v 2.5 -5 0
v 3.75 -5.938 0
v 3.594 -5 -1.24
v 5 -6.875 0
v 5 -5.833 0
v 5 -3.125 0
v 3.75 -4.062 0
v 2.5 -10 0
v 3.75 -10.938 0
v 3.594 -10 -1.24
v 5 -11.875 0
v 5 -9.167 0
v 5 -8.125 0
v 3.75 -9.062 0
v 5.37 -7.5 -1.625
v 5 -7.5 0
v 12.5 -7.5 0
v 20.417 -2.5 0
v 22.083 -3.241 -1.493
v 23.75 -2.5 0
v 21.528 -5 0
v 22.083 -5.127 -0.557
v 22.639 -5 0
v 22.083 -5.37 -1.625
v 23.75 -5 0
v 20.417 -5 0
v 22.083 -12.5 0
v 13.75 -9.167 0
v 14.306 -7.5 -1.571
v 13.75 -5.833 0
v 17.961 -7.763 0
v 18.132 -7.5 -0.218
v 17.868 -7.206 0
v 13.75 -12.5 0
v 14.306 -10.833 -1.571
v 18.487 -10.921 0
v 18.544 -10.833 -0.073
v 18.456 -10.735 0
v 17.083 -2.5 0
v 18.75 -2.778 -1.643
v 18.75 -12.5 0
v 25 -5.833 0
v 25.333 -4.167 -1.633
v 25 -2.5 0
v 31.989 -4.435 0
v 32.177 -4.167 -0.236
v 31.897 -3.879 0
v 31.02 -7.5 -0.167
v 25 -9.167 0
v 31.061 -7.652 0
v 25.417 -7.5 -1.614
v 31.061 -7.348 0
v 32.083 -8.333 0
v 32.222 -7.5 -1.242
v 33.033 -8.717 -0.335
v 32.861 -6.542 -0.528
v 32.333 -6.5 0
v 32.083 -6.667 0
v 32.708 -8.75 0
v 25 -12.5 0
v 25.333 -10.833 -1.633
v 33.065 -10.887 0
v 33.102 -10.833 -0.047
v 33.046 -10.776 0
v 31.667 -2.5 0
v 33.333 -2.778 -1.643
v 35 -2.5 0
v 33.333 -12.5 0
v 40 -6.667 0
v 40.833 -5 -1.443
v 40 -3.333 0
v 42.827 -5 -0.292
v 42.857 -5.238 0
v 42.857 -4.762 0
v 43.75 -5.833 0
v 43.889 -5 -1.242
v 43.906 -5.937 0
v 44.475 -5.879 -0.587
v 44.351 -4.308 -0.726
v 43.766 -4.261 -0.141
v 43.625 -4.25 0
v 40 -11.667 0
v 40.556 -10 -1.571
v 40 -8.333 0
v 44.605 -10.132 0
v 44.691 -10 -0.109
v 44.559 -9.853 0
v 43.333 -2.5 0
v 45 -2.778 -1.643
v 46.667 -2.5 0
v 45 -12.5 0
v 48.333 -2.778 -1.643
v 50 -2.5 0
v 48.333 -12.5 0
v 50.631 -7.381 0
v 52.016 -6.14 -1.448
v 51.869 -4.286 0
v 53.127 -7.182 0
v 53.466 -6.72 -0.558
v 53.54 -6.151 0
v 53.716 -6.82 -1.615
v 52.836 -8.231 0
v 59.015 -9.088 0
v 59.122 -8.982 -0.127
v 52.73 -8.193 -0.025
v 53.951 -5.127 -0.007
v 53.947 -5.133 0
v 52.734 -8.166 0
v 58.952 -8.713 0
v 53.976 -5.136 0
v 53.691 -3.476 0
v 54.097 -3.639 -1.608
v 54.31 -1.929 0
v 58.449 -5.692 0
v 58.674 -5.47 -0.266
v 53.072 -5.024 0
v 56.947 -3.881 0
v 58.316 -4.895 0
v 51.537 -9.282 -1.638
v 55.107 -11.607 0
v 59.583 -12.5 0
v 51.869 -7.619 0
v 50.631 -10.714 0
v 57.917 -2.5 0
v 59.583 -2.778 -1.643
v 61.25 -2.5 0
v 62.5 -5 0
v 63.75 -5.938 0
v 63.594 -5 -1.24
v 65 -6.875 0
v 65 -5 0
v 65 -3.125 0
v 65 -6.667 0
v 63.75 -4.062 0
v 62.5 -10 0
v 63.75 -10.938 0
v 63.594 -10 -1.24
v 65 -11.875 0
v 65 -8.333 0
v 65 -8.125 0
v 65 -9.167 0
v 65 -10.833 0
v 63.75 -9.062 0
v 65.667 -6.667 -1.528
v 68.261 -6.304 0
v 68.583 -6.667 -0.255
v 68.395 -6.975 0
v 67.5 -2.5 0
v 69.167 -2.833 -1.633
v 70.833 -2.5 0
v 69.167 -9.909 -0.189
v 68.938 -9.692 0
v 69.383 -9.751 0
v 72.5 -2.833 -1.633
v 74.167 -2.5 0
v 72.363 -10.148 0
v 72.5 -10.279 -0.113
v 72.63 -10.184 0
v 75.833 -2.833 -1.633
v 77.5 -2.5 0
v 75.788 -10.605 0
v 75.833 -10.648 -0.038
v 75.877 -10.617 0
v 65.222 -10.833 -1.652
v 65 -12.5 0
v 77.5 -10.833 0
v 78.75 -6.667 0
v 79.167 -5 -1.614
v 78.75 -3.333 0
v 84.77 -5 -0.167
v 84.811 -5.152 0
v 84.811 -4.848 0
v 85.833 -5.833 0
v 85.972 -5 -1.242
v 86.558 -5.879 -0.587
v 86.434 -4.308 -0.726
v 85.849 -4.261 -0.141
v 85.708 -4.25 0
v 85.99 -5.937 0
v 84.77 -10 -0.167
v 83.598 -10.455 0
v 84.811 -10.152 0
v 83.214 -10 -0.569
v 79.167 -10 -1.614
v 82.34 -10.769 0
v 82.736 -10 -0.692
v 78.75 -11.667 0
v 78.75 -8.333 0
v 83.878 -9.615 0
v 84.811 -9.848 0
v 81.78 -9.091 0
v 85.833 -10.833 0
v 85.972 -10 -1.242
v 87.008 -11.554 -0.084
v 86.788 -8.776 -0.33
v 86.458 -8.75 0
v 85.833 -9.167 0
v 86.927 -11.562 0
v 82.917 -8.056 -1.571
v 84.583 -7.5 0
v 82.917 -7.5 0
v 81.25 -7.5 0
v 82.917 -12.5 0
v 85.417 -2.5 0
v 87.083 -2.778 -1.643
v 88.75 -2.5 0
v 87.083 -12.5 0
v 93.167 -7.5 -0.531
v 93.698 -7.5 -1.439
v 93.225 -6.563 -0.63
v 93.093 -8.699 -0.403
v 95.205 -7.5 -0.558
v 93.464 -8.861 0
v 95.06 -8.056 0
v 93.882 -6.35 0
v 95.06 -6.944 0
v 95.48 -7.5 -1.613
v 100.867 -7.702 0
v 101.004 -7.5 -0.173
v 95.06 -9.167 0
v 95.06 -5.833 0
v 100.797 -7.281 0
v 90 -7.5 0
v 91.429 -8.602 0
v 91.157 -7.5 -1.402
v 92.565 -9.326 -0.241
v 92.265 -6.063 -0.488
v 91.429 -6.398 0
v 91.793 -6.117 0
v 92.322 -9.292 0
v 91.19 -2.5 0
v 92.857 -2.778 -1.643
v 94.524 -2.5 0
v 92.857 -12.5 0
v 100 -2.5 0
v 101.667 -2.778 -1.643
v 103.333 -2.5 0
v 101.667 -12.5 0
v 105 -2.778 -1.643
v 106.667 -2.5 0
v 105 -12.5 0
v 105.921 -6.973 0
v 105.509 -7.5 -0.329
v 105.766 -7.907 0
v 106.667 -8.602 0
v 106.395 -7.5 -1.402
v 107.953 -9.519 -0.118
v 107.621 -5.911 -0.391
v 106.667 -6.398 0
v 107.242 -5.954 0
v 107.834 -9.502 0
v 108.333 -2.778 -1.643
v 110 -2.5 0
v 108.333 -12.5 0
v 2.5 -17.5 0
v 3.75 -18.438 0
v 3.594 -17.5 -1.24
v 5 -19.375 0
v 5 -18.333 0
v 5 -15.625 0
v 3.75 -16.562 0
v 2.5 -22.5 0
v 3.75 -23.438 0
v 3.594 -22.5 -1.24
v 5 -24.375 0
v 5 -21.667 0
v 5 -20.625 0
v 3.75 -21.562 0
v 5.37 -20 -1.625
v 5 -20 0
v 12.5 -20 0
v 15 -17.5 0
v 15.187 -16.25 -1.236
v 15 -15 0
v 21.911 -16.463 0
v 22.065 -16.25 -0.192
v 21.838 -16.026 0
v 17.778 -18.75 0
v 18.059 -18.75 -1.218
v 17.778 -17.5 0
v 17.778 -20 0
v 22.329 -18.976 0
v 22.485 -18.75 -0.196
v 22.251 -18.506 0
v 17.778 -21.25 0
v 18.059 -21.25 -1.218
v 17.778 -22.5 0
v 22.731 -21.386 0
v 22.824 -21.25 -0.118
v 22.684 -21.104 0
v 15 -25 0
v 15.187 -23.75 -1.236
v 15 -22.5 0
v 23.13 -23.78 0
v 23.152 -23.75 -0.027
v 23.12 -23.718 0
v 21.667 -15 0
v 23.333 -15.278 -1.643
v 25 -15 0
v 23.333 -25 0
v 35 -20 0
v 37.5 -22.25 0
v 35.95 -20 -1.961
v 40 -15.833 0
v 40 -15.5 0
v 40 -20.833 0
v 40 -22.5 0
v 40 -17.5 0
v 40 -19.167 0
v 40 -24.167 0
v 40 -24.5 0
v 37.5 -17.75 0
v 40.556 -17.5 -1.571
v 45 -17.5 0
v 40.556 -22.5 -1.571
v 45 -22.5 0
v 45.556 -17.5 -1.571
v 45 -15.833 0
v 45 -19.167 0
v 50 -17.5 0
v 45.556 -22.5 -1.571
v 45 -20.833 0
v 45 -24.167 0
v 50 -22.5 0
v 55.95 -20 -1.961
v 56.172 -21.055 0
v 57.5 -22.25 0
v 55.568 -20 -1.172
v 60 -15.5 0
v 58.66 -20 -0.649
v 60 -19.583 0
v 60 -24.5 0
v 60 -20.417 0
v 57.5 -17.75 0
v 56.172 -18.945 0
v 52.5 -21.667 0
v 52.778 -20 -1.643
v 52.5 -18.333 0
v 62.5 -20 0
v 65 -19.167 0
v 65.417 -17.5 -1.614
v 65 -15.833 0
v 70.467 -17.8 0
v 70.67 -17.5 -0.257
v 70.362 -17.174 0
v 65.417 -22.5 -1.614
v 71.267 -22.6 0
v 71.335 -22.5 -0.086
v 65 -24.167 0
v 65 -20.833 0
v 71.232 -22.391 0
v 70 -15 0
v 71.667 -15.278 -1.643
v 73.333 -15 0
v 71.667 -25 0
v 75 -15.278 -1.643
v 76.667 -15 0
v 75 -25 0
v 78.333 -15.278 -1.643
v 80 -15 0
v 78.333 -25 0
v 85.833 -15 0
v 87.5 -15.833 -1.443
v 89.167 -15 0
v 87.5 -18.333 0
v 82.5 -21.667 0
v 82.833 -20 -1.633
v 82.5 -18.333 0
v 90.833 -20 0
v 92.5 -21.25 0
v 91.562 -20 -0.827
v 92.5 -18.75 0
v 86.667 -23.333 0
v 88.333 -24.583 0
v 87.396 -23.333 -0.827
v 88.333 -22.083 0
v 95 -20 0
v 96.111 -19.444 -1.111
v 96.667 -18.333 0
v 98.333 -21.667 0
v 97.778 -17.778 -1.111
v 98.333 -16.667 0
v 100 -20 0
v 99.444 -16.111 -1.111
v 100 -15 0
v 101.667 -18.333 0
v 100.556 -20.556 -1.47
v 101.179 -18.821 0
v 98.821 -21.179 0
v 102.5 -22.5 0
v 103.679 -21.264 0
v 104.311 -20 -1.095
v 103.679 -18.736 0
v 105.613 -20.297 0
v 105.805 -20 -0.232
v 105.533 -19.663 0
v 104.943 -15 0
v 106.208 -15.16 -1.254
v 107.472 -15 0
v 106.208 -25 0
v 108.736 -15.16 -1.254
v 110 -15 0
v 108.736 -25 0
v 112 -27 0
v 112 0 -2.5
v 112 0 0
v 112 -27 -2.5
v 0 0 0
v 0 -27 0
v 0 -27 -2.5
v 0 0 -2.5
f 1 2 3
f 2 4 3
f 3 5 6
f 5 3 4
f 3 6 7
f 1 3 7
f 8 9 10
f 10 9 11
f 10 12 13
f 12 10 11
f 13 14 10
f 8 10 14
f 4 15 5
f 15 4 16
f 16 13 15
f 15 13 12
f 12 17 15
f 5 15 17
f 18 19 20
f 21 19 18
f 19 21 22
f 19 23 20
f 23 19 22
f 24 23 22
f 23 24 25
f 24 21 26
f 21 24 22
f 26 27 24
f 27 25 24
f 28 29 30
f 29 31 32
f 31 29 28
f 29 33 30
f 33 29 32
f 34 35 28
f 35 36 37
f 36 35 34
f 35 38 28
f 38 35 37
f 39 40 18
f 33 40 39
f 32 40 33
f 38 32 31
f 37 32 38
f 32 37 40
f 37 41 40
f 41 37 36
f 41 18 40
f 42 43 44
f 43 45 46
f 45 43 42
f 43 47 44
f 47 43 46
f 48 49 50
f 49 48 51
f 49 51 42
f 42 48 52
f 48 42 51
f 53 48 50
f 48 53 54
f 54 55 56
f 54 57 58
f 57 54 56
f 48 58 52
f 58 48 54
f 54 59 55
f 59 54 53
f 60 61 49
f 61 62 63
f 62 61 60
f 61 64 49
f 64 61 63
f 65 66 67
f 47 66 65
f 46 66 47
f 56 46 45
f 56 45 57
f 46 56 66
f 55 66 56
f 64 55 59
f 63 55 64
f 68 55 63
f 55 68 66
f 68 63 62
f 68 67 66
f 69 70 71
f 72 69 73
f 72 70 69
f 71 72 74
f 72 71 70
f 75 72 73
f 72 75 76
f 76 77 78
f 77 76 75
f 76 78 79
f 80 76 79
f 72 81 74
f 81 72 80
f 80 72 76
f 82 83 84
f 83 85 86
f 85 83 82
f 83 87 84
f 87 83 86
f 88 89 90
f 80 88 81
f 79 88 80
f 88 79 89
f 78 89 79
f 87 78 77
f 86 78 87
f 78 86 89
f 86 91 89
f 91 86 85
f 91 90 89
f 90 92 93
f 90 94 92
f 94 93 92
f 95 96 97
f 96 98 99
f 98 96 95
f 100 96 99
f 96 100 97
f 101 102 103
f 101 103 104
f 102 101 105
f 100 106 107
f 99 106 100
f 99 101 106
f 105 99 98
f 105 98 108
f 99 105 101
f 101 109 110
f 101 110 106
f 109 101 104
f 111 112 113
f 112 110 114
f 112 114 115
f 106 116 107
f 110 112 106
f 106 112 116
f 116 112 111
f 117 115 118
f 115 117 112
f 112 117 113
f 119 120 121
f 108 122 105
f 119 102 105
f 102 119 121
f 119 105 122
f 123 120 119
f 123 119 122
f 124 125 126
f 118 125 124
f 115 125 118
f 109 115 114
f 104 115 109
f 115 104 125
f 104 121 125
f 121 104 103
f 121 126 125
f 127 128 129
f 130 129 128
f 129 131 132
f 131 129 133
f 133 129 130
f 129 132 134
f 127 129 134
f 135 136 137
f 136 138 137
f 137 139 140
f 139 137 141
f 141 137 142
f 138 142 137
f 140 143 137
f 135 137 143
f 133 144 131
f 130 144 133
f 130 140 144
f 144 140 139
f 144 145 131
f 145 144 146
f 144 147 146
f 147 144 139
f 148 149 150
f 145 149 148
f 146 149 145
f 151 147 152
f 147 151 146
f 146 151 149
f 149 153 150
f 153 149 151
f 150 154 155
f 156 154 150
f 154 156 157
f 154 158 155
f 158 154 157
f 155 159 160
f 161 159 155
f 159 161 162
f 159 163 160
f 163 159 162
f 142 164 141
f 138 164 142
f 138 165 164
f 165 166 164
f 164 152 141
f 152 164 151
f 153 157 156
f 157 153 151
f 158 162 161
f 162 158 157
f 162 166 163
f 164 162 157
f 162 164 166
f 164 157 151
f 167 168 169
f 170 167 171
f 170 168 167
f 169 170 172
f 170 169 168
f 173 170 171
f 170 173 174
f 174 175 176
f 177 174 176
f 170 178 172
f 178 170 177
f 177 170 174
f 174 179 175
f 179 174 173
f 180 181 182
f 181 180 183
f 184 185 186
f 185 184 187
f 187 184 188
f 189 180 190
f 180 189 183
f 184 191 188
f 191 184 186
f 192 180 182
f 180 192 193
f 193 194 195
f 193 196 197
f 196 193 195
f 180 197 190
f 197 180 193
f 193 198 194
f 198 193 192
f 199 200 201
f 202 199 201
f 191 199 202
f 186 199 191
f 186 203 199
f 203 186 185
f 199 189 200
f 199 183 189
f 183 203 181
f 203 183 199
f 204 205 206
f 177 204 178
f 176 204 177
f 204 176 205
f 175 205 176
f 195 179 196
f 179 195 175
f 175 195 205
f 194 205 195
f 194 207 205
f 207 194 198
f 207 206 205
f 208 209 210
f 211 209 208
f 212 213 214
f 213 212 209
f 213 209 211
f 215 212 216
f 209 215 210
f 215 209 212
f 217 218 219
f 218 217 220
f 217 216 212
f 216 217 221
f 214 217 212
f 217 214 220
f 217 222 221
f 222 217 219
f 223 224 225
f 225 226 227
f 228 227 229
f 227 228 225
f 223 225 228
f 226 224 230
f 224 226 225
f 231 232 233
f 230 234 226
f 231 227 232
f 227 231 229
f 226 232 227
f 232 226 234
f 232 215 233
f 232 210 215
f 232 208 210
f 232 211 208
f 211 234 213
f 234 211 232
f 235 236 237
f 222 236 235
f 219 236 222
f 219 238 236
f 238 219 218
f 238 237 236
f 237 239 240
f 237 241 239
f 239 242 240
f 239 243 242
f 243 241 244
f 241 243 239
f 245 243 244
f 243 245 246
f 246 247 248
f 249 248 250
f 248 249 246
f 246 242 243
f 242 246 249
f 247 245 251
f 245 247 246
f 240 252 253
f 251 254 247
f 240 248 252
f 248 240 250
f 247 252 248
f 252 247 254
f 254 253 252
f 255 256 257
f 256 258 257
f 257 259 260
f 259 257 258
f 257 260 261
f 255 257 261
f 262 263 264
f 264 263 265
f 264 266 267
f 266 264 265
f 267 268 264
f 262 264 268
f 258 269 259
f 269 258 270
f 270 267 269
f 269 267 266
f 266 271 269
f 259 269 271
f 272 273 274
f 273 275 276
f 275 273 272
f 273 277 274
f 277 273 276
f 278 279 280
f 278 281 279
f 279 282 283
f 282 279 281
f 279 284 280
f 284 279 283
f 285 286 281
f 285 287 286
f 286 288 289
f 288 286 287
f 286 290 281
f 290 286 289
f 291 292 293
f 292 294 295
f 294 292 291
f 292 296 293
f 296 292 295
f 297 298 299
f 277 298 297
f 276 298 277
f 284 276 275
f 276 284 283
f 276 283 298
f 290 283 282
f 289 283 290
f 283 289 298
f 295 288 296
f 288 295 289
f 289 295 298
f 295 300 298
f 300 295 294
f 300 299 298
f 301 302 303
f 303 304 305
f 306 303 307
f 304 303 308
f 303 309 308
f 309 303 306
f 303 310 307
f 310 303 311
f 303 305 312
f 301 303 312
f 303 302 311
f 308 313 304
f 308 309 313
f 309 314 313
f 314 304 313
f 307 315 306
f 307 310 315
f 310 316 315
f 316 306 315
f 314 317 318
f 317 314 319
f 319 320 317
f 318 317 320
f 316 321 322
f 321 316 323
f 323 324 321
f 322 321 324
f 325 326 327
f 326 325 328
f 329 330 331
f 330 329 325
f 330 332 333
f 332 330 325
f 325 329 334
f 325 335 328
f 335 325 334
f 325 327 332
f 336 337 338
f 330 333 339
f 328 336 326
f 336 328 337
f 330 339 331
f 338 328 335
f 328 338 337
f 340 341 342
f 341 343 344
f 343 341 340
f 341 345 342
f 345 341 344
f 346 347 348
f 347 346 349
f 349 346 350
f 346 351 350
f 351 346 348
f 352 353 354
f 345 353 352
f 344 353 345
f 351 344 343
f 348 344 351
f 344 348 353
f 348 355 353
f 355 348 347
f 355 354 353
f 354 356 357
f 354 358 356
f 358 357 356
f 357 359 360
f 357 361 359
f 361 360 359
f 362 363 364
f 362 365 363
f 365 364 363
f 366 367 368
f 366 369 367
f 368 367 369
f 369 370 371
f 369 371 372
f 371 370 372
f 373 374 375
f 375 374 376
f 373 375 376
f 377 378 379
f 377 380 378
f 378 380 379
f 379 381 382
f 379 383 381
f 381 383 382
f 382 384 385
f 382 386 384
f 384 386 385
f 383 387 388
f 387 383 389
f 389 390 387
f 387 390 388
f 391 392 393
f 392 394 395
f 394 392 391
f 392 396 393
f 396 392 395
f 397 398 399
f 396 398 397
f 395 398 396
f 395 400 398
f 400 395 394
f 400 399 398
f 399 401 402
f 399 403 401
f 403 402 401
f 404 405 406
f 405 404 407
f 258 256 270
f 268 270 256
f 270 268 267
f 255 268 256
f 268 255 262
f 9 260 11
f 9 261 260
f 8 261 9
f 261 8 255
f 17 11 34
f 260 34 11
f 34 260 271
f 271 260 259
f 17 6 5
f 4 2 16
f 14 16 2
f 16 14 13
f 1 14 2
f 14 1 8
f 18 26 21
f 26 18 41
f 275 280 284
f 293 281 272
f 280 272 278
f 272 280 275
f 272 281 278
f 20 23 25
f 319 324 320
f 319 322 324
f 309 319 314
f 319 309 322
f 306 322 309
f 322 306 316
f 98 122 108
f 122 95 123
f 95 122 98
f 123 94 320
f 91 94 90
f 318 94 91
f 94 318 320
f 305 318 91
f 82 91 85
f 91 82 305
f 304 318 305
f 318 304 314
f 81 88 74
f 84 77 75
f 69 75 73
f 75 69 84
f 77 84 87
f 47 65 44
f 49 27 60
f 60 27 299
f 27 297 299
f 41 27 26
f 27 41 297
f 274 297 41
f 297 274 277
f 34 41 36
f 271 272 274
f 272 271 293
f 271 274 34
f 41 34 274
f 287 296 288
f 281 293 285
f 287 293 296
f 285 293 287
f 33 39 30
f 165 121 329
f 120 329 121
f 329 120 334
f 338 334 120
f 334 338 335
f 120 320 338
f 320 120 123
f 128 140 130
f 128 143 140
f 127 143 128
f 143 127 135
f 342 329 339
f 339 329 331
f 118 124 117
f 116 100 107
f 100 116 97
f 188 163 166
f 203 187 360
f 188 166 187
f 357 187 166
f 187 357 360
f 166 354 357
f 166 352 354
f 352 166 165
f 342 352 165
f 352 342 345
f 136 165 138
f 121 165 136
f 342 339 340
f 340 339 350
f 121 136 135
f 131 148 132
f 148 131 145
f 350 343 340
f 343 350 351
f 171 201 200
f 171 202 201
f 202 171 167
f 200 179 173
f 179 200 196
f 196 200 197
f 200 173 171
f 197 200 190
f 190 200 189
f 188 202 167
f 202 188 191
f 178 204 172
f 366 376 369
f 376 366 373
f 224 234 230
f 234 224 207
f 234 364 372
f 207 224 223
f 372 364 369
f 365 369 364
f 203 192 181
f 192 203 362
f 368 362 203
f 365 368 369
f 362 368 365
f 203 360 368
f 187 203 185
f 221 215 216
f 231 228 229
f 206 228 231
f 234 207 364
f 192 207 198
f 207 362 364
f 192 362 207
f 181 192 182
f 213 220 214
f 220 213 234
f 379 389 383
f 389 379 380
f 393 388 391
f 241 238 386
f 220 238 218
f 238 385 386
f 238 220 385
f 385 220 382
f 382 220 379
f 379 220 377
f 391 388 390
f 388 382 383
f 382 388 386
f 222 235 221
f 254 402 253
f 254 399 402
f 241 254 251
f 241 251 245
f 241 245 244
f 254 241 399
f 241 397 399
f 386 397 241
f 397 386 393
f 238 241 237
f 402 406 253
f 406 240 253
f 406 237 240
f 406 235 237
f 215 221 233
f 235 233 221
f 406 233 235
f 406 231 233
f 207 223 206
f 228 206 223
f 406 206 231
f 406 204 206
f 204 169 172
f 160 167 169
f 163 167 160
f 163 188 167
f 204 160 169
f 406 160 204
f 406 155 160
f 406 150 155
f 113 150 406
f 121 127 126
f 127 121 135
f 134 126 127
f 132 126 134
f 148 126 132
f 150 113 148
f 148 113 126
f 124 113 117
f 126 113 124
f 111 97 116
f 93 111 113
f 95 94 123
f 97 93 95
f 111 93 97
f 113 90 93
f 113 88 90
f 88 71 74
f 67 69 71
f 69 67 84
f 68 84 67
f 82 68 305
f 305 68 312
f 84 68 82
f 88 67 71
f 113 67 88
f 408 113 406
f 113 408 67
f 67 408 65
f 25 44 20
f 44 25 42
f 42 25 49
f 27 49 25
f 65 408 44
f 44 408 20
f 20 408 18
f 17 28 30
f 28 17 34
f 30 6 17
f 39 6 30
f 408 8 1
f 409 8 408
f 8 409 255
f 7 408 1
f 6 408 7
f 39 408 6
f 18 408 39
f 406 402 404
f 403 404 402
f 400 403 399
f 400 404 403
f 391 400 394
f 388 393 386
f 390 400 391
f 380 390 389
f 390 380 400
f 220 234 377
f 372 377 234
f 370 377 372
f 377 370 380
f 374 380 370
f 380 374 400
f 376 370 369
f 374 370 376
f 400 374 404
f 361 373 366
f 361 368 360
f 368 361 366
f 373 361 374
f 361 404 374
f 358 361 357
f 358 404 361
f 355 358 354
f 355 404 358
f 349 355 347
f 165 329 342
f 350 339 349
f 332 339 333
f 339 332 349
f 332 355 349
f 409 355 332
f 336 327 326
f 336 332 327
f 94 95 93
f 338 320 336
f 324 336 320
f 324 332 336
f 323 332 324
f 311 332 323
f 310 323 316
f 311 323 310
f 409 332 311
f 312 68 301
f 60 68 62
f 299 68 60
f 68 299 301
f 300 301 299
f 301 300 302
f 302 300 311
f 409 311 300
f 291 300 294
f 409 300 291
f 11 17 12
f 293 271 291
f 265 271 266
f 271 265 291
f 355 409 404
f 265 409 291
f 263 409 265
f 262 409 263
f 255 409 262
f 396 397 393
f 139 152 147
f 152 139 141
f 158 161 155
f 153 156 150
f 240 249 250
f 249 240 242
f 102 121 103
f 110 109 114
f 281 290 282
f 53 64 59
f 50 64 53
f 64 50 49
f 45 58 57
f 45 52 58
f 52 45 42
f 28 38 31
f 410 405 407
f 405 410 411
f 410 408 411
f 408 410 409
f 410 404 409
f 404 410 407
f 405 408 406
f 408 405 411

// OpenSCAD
// file: cuneiform.scad
MAX_STROKE_WIDTH = 1/5;

module wedge(x, y, z, w, h, phi, o=false){
	// o is for offset, an experiment with moving the stroke so that its greatest depth would be at the origin point
	// It's not working very well; just don't use it for now
	// Also need to extend the stroke by delta if we do that
	
	s = w / sqrt(2);
	d = w / 2; // Depth of stroke, from head to deepest point
	l = sqrt(h*h - d*d); // Length of stroke, from deepest point to tip
	theta = atan(d/l); // Angle of stylus
	delta = o ? d*sin(theta) : 0; // Horizontal distance from head of wedge to greatest depth

	translate([x, y, z])
	rotate([0, 0, phi])
	translate([-delta, 0, 0])
	rotate([0, -theta, 0])
	rotate([45, 0, 0])
	translate([0, -s/2, -s/2])
	cube([l, s, s]);
}

module haken(x, y, z, s, d){ // Winkelhaken, positioned from top left corner - now called from the more elaborate hookstroke below
	w = s*sqrt(2);
	theta = atan(d/(w/2));
	translate([x, y, z])
	rotate([0, -theta, 0])
	translate([0, 0, -d])
	rotate([0, 0, -45])
	cube([s, s, d]);
}

module singlestroke(x, y, w, h){ // Vertical, positioned from top left corner
	w2 = min(h, w, MAX_STROKE_WIDTH);
	wedge(x+w/2, y, 0, w2, h, 90);
}

module doublestroke(x, y, w, h){
	w2 = min(h, w, MAX_STROKE_WIDTH);
	dist = min(w2, h/4);
	h2 = h - dist;
	h3 = h2 / 2;
	wedge(x+w/2, y, 0, w2, h3, 90);
	wedge(x+w/2, y+dist, 0, w2, h2, 90);
}

module triplestroke(x, y, w, h){
	w2 = min(h, w, MAX_STROKE_WIDTH);
	dist = min(w2, h/4);
	h2 = h - dist*2;
	h3 = min(h2/2, h-dist*2);
	wedge(x+w/2, y, 0, w2, h3, 90);
	wedge(x+w/2, y+dist, 0, w2, h3, 90);
	wedge(x+w/2, y+dist*2, 0, w2, h2, 90);
}

module hookstroke(x, y, w, h, factor=0.75){
//	hh = (w-h/2<0.0001) ? factor*h : h; // By default, the renderer produces hakens that are twice as tall as they are wide - but that means d = 0!
	// We fix this by reducing h by a factor < 1, when this happens
	// Comparing against epsilon instead of zero because transferring numbers from Python to SCAD can do weird things occasionally
	// Experiment: changing w instead of h to make hakens wider, which makes them more visible when they're pressed against verticals
	// Experiment undone - it works better changing h and having an adjustment in the renderer for when it's pressed against a vertical
//	ww = (w-h/2<0.0001) ? w/factor : w;
	ww = w; // We bring in ww and hh because SCAD does single assignment of variables
	hh = (w-h/2<0.0001) ? h*factor : h;
	s = hh / sqrt(2); // Side length of the square we're going to embed
	d = sqrt(ww*ww - hh*hh/4); // Depth that square is going to sink into the tablet
	deltaw = (ww-w);
	haken(x-deltaw, y+h/2, 0, s, d); // Use h instead of hh because the haken() module wants the position of the tip, and that needs to be at the midpoint of the *original* bounding box
}

module hrule(y, w, h=0.05){ // Draw a horizontal rule at a given y-value, spanning a given width; h is the thickness of the rule
	s = h*sqrt(2)/2; // Side length of a square with diagonal h
	translate([0, y, -s])
		rotate([45, 0, 0])
			cube([w, h, h]);
}

module edgerule(y, w, h=0.05, top=true){ // Like hrule except it's cut in half to go at the top and bottom of a cylinder seal
	s = h*sqrt(2)/2;
	translate([0, y, -s])
		difference(){
			rotate([45, 0, 0])
				cube([w, h, h]);
			translate([-0.01, (top ? -h : 0), 0])
				cube([w+0.02, h, 2*h]);
		}
}

module vrule(x, h, w=0.05){ // Vertical rule, like hrule but reversed
	s = w*sqrt(2)/2;
	translate([x, 0, 0]) // TODO why 0 and not -s for the third?
		rotate([0, 45, 0])
			cube([w, h, w]);
}

module hatcharea(x, y, w, h){
	// TODO
}
// main file
include <../3dmodel/cuneiform.scad>



scale([1,-1,1]){
	difference(){
	/*	difference(){
		//	translate([0, 27*sqrt(5)/4, 0])
			rotate([26.57, 0, 0])
			translate([112/2, 27*sqrt(5)/4, -27*sqrt(5)/4])
				%cube([112, 27*sqrt(5)/2, 27*sqrt(5)/2], center=true);
		} */
		translate([0,0,-2.5])
			cube([112,27,2.5]);
		union(){
			translate([2.5,2.5,0]){
				scale([10.0,10.0,10.0]){
					translate([0,0,0]){
						hookstroke(0.0, 0.0, 0.25, 0.5);
						hookstroke(0.0, 0.5, 0.25, 0.5);
						rotate(-90.0){
							singlestroke(-0.6666666666666667, 0.25, 0.3333333333333333, 0.75);
						}
					}
					translate([1.125,0,0]){
						rotate(-90.0){
							singlestroke(-0.6666666666666667, 0, 0.3333333333333333, 0.5);
						}
						rotate(-90.0){
							singlestroke(-1.0, 0, 0.3333333333333333, 0.5);
						}
						singlestroke(0.33333333333333337, 0, 0.3333333333333333, 1);
						doublestroke(0.6666666666666667, 0, 0.3333333333333333, 1);
					}
					translate([2.25,0,0]){
						rotate(-90.0){
							singlestroke(-0.3333333333333333, 0, 0.3333333333333333, 0.8333333333333333);
						}
						rotate(-90.0){
							singlestroke(-0.6666666666666666, 0, 0.3333333333333333, 0.6666666666666666);
						}
						hookstroke(0.5833333333333333, 0.3333333333333333, 0.25, 0.3333333333333333);
						rotate(-90.0){
							singlestroke(-1.0, 0, 0.3333333333333333, 0.8333333333333333);
						}
						singlestroke(0.6666666666666666, 0, 0.3333333333333333, 1);
					}
					translate([3.75,0,0]){
						rotate(-90.0){
							singlestroke(-0.41666666666666663, 0, 0.3333333333333333, 0.33333333333333337);
						}
						hookstroke(0.25000000000000006, 0.08333333333333334, 0.25, 0.3333333333333333);
						rotate(-90.0){
							singlestroke(-0.9166666666666667, 0, 0.3333333333333333, 0.5);
						}
						singlestroke(0.33333333333333337, 0, 0.3333333333333333, 1);
						singlestroke(0.6666666666666667, 0, 0.3333333333333333, 1);
					}
					translate([4.875,0,0]){
						translate([0,0.0,0]){
							rotate(-68.19859051364818){
								translate([-0.16666666666666666,0,0]){
									singlestroke(0, 0.26287970903375835, 0.3333333333333333, 0.6346477588219922);
								}
							}
						}
						translate([0,0.3333333333333333,0]){
							rotate(-68.19859051364818){
								translate([-0.16666666666666666,0,0]){
									doublestroke(0, 0, 0.3333333333333333, 0.8975274678557505);
								}
							}
						}
						translate([0,0.6666666666666666,0]){
							rotate(-68.19859051364818){
								translate([-0.16666666666666666,0,0]){
									singlestroke(0, 0, 0.3333333333333333, 0.8975274678557505);
								}
							}
						}
						singlestroke(0.6666666666666666, 0, 0.3333333333333333, 1);
					}
					translate([6.0,0,0]){
						hookstroke(0.0, 0.0, 0.25, 0.5);
						hookstroke(0.0, 0.5, 0.25, 0.5);
						rotate(-90.0){
							singlestroke(-0.5833333333333333, 0.25, 0.3333333333333333, 0.41666666666666674);
						}
						singlestroke(0.5000000000000001, 0, 0.3333333333333333, 0.8333333333333333);
						singlestroke(0.8333333333333335, 0, 0.3333333333333333, 0.8333333333333333);
						singlestroke(1.1666666666666667, 0, 0.3333333333333333, 0.8333333333333333);
						rotate(-90.0){
							singlestroke(-1.0, 0.25, 0.3333333333333333, 1.25);
						}
					}
					translate([7.625,0,0]){
						rotate(-90.0){
							singlestroke(-0.41666666666666663, 0, 0.3333333333333333, 0.6666666666666666);
						}
						hookstroke(0.5833333333333333, 0.08333333333333334, 0.25, 0.3333333333333333);
						rotate(-90.0){
							singlestroke(-0.9166666666666667, 0, 0.3333333333333333, 0.6666666666666666);
						}
						hookstroke(0.5833333333333333, 0.5833333333333334, 0.25, 0.3333333333333333);
						singlestroke(0.24999999999999997, 0.5, 0.3333333333333333, 0.5);
						singlestroke(0.6666666666666666, 0, 0.3333333333333333, 1);
					}
					translate([8.75,0,0]){
						hookstroke(0, 0.2142857142857143, 0.2857142857142857, 0.5714285714285714, 0.7714285714285715);
						singlestroke(0.11904761904761904, 0, 0.3333333333333333, 1);
						rotate(-90.0){
							doublestroke(-0.6666666666666667, 0.2857142857142857, 0.3333333333333333, 0.880952380952381);
						}
						singlestroke(1.0, 0, 0.3333333333333333, 1);
						singlestroke(1.3333333333333333, 0, 0.3333333333333333, 1);
						hookstroke(1.5238095238095237, 0.2142857142857143, 0.2857142857142857, 0.5714285714285714, 0.7714285714285715);
						singlestroke(1.6666666666666665, 0, 0.3333333333333333, 1);
					}
					translate([0,1.25,0]){
						hookstroke(0.0, 0.0, 0.25, 0.5);
						hookstroke(0.0, 0.5, 0.25, 0.5);
						rotate(-90.0){
							singlestroke(-0.6666666666666667, 0.25, 0.3333333333333333, 0.75);
						}
					}
					translate([1.25,1.25,0]){
						rotate(-90.0){
							singlestroke(-0.25, 0, 0.25, 0.8333333333333333);
						}
						rotate(-90.0){
							singlestroke(-0.5, 0.27777777777777773, 0.25, 0.5555555555555556);
						}
						rotate(-90.0){
							singlestroke(-0.75, 0.27777777777777773, 0.25, 0.5555555555555556);
						}
						rotate(-90.0){
							singlestroke(-1.0, 0, 0.25, 0.8333333333333333);
						}
						singlestroke(0.6666666666666666, 0, 0.3333333333333333, 1);
					}
					translate([3.25,1.25,0]){
						hookstroke(0.0, 0, 0.5, 1, 0.9);
						rotate(-90.0){
							singlestroke(-0.41666666666666663, 0.5, 0.3333333333333333, 0.5);
						}
						rotate(-90.0){
							singlestroke(-0.9166666666666667, 0.5, 0.3333333333333333, 0.5);
						}
						rotate(-90.0){
							singlestroke(-0.41666666666666663, 1.0, 0.3333333333333333, 0.5);
						}
						rotate(-90.0){
							singlestroke(-0.9166666666666667, 1.0, 0.3333333333333333, 0.5);
						}
					}
					translate([5.0,1.25,0]){
						hookstroke(0.25, 0, 0.5, 1, 0.9);
						rotate(-90.0){
							singlestroke(-0.6666666666666667, 0, 0.3333333333333333, 1);
						}
					}
					translate([6.25,1.25,0]){
						rotate(-90.0){
							singlestroke(-0.41666666666666663, 0, 0.3333333333333333, 0.6666666666666667);
						}
						rotate(-90.0){
							singlestroke(-0.9166666666666667, 0, 0.3333333333333333, 0.6666666666666667);
						}
						singlestroke(0.5000000000000001, 0, 0.3333333333333333, 1);
						singlestroke(0.8333333333333334, 0, 0.3333333333333333, 1);
						singlestroke(1.1666666666666665, 0, 0.3333333333333333, 1);
					}
					translate([8.0,1.25,0]){
						singlestroke(0.33333333333333337, 0.0, 0.3333333333333333, 0.3333333333333333);
						rotate(-90.0){
							singlestroke(-0.6666666666666666, 0, 0.3333333333333333, 0.8333333333333334);
						}
						hookstroke(0.8333333333333335, 0.3333333333333333, 0.16666666666666666, 0.3333333333333333);
						hookstroke(0.4166666666666667, 0.6666666666666666, 0.16666666666666666, 0.3333333333333333);
					}
					translate([9.25,1.25,0]){
						translate([0.0,0.5,0]){
							rotate(-45.0){
								singlestroke(0.0, 0.0, 0.23570226039551587, 0.3535533905932738);
								singlestroke(0.23570226039551587, 0.0, 0.23570226039551587, 0.3535533905932738);
								singlestroke(0.47140452079103173, 0.0, 0.23570226039551587, 0.3535533905932738);
								singlestroke(0.18688672392660713, 0.3535533905932738, 0.3333333333333333, 0.3535533905932738);
							}
						}
						rotate(-90.0){
							singlestroke(-0.6666666666666667, 0.8678511301977581, 0.3333333333333333, 0.2528270299749193);
						}
						singlestroke(0.9943459400501615, 0, 0.2528270299749193, 1);
						singlestroke(1.2471729700250809, 0, 0.2528270299749193, 1);
					}
				}
			}
		}
	}
}

MAX_STROKE_WIDTH = 1/3;
